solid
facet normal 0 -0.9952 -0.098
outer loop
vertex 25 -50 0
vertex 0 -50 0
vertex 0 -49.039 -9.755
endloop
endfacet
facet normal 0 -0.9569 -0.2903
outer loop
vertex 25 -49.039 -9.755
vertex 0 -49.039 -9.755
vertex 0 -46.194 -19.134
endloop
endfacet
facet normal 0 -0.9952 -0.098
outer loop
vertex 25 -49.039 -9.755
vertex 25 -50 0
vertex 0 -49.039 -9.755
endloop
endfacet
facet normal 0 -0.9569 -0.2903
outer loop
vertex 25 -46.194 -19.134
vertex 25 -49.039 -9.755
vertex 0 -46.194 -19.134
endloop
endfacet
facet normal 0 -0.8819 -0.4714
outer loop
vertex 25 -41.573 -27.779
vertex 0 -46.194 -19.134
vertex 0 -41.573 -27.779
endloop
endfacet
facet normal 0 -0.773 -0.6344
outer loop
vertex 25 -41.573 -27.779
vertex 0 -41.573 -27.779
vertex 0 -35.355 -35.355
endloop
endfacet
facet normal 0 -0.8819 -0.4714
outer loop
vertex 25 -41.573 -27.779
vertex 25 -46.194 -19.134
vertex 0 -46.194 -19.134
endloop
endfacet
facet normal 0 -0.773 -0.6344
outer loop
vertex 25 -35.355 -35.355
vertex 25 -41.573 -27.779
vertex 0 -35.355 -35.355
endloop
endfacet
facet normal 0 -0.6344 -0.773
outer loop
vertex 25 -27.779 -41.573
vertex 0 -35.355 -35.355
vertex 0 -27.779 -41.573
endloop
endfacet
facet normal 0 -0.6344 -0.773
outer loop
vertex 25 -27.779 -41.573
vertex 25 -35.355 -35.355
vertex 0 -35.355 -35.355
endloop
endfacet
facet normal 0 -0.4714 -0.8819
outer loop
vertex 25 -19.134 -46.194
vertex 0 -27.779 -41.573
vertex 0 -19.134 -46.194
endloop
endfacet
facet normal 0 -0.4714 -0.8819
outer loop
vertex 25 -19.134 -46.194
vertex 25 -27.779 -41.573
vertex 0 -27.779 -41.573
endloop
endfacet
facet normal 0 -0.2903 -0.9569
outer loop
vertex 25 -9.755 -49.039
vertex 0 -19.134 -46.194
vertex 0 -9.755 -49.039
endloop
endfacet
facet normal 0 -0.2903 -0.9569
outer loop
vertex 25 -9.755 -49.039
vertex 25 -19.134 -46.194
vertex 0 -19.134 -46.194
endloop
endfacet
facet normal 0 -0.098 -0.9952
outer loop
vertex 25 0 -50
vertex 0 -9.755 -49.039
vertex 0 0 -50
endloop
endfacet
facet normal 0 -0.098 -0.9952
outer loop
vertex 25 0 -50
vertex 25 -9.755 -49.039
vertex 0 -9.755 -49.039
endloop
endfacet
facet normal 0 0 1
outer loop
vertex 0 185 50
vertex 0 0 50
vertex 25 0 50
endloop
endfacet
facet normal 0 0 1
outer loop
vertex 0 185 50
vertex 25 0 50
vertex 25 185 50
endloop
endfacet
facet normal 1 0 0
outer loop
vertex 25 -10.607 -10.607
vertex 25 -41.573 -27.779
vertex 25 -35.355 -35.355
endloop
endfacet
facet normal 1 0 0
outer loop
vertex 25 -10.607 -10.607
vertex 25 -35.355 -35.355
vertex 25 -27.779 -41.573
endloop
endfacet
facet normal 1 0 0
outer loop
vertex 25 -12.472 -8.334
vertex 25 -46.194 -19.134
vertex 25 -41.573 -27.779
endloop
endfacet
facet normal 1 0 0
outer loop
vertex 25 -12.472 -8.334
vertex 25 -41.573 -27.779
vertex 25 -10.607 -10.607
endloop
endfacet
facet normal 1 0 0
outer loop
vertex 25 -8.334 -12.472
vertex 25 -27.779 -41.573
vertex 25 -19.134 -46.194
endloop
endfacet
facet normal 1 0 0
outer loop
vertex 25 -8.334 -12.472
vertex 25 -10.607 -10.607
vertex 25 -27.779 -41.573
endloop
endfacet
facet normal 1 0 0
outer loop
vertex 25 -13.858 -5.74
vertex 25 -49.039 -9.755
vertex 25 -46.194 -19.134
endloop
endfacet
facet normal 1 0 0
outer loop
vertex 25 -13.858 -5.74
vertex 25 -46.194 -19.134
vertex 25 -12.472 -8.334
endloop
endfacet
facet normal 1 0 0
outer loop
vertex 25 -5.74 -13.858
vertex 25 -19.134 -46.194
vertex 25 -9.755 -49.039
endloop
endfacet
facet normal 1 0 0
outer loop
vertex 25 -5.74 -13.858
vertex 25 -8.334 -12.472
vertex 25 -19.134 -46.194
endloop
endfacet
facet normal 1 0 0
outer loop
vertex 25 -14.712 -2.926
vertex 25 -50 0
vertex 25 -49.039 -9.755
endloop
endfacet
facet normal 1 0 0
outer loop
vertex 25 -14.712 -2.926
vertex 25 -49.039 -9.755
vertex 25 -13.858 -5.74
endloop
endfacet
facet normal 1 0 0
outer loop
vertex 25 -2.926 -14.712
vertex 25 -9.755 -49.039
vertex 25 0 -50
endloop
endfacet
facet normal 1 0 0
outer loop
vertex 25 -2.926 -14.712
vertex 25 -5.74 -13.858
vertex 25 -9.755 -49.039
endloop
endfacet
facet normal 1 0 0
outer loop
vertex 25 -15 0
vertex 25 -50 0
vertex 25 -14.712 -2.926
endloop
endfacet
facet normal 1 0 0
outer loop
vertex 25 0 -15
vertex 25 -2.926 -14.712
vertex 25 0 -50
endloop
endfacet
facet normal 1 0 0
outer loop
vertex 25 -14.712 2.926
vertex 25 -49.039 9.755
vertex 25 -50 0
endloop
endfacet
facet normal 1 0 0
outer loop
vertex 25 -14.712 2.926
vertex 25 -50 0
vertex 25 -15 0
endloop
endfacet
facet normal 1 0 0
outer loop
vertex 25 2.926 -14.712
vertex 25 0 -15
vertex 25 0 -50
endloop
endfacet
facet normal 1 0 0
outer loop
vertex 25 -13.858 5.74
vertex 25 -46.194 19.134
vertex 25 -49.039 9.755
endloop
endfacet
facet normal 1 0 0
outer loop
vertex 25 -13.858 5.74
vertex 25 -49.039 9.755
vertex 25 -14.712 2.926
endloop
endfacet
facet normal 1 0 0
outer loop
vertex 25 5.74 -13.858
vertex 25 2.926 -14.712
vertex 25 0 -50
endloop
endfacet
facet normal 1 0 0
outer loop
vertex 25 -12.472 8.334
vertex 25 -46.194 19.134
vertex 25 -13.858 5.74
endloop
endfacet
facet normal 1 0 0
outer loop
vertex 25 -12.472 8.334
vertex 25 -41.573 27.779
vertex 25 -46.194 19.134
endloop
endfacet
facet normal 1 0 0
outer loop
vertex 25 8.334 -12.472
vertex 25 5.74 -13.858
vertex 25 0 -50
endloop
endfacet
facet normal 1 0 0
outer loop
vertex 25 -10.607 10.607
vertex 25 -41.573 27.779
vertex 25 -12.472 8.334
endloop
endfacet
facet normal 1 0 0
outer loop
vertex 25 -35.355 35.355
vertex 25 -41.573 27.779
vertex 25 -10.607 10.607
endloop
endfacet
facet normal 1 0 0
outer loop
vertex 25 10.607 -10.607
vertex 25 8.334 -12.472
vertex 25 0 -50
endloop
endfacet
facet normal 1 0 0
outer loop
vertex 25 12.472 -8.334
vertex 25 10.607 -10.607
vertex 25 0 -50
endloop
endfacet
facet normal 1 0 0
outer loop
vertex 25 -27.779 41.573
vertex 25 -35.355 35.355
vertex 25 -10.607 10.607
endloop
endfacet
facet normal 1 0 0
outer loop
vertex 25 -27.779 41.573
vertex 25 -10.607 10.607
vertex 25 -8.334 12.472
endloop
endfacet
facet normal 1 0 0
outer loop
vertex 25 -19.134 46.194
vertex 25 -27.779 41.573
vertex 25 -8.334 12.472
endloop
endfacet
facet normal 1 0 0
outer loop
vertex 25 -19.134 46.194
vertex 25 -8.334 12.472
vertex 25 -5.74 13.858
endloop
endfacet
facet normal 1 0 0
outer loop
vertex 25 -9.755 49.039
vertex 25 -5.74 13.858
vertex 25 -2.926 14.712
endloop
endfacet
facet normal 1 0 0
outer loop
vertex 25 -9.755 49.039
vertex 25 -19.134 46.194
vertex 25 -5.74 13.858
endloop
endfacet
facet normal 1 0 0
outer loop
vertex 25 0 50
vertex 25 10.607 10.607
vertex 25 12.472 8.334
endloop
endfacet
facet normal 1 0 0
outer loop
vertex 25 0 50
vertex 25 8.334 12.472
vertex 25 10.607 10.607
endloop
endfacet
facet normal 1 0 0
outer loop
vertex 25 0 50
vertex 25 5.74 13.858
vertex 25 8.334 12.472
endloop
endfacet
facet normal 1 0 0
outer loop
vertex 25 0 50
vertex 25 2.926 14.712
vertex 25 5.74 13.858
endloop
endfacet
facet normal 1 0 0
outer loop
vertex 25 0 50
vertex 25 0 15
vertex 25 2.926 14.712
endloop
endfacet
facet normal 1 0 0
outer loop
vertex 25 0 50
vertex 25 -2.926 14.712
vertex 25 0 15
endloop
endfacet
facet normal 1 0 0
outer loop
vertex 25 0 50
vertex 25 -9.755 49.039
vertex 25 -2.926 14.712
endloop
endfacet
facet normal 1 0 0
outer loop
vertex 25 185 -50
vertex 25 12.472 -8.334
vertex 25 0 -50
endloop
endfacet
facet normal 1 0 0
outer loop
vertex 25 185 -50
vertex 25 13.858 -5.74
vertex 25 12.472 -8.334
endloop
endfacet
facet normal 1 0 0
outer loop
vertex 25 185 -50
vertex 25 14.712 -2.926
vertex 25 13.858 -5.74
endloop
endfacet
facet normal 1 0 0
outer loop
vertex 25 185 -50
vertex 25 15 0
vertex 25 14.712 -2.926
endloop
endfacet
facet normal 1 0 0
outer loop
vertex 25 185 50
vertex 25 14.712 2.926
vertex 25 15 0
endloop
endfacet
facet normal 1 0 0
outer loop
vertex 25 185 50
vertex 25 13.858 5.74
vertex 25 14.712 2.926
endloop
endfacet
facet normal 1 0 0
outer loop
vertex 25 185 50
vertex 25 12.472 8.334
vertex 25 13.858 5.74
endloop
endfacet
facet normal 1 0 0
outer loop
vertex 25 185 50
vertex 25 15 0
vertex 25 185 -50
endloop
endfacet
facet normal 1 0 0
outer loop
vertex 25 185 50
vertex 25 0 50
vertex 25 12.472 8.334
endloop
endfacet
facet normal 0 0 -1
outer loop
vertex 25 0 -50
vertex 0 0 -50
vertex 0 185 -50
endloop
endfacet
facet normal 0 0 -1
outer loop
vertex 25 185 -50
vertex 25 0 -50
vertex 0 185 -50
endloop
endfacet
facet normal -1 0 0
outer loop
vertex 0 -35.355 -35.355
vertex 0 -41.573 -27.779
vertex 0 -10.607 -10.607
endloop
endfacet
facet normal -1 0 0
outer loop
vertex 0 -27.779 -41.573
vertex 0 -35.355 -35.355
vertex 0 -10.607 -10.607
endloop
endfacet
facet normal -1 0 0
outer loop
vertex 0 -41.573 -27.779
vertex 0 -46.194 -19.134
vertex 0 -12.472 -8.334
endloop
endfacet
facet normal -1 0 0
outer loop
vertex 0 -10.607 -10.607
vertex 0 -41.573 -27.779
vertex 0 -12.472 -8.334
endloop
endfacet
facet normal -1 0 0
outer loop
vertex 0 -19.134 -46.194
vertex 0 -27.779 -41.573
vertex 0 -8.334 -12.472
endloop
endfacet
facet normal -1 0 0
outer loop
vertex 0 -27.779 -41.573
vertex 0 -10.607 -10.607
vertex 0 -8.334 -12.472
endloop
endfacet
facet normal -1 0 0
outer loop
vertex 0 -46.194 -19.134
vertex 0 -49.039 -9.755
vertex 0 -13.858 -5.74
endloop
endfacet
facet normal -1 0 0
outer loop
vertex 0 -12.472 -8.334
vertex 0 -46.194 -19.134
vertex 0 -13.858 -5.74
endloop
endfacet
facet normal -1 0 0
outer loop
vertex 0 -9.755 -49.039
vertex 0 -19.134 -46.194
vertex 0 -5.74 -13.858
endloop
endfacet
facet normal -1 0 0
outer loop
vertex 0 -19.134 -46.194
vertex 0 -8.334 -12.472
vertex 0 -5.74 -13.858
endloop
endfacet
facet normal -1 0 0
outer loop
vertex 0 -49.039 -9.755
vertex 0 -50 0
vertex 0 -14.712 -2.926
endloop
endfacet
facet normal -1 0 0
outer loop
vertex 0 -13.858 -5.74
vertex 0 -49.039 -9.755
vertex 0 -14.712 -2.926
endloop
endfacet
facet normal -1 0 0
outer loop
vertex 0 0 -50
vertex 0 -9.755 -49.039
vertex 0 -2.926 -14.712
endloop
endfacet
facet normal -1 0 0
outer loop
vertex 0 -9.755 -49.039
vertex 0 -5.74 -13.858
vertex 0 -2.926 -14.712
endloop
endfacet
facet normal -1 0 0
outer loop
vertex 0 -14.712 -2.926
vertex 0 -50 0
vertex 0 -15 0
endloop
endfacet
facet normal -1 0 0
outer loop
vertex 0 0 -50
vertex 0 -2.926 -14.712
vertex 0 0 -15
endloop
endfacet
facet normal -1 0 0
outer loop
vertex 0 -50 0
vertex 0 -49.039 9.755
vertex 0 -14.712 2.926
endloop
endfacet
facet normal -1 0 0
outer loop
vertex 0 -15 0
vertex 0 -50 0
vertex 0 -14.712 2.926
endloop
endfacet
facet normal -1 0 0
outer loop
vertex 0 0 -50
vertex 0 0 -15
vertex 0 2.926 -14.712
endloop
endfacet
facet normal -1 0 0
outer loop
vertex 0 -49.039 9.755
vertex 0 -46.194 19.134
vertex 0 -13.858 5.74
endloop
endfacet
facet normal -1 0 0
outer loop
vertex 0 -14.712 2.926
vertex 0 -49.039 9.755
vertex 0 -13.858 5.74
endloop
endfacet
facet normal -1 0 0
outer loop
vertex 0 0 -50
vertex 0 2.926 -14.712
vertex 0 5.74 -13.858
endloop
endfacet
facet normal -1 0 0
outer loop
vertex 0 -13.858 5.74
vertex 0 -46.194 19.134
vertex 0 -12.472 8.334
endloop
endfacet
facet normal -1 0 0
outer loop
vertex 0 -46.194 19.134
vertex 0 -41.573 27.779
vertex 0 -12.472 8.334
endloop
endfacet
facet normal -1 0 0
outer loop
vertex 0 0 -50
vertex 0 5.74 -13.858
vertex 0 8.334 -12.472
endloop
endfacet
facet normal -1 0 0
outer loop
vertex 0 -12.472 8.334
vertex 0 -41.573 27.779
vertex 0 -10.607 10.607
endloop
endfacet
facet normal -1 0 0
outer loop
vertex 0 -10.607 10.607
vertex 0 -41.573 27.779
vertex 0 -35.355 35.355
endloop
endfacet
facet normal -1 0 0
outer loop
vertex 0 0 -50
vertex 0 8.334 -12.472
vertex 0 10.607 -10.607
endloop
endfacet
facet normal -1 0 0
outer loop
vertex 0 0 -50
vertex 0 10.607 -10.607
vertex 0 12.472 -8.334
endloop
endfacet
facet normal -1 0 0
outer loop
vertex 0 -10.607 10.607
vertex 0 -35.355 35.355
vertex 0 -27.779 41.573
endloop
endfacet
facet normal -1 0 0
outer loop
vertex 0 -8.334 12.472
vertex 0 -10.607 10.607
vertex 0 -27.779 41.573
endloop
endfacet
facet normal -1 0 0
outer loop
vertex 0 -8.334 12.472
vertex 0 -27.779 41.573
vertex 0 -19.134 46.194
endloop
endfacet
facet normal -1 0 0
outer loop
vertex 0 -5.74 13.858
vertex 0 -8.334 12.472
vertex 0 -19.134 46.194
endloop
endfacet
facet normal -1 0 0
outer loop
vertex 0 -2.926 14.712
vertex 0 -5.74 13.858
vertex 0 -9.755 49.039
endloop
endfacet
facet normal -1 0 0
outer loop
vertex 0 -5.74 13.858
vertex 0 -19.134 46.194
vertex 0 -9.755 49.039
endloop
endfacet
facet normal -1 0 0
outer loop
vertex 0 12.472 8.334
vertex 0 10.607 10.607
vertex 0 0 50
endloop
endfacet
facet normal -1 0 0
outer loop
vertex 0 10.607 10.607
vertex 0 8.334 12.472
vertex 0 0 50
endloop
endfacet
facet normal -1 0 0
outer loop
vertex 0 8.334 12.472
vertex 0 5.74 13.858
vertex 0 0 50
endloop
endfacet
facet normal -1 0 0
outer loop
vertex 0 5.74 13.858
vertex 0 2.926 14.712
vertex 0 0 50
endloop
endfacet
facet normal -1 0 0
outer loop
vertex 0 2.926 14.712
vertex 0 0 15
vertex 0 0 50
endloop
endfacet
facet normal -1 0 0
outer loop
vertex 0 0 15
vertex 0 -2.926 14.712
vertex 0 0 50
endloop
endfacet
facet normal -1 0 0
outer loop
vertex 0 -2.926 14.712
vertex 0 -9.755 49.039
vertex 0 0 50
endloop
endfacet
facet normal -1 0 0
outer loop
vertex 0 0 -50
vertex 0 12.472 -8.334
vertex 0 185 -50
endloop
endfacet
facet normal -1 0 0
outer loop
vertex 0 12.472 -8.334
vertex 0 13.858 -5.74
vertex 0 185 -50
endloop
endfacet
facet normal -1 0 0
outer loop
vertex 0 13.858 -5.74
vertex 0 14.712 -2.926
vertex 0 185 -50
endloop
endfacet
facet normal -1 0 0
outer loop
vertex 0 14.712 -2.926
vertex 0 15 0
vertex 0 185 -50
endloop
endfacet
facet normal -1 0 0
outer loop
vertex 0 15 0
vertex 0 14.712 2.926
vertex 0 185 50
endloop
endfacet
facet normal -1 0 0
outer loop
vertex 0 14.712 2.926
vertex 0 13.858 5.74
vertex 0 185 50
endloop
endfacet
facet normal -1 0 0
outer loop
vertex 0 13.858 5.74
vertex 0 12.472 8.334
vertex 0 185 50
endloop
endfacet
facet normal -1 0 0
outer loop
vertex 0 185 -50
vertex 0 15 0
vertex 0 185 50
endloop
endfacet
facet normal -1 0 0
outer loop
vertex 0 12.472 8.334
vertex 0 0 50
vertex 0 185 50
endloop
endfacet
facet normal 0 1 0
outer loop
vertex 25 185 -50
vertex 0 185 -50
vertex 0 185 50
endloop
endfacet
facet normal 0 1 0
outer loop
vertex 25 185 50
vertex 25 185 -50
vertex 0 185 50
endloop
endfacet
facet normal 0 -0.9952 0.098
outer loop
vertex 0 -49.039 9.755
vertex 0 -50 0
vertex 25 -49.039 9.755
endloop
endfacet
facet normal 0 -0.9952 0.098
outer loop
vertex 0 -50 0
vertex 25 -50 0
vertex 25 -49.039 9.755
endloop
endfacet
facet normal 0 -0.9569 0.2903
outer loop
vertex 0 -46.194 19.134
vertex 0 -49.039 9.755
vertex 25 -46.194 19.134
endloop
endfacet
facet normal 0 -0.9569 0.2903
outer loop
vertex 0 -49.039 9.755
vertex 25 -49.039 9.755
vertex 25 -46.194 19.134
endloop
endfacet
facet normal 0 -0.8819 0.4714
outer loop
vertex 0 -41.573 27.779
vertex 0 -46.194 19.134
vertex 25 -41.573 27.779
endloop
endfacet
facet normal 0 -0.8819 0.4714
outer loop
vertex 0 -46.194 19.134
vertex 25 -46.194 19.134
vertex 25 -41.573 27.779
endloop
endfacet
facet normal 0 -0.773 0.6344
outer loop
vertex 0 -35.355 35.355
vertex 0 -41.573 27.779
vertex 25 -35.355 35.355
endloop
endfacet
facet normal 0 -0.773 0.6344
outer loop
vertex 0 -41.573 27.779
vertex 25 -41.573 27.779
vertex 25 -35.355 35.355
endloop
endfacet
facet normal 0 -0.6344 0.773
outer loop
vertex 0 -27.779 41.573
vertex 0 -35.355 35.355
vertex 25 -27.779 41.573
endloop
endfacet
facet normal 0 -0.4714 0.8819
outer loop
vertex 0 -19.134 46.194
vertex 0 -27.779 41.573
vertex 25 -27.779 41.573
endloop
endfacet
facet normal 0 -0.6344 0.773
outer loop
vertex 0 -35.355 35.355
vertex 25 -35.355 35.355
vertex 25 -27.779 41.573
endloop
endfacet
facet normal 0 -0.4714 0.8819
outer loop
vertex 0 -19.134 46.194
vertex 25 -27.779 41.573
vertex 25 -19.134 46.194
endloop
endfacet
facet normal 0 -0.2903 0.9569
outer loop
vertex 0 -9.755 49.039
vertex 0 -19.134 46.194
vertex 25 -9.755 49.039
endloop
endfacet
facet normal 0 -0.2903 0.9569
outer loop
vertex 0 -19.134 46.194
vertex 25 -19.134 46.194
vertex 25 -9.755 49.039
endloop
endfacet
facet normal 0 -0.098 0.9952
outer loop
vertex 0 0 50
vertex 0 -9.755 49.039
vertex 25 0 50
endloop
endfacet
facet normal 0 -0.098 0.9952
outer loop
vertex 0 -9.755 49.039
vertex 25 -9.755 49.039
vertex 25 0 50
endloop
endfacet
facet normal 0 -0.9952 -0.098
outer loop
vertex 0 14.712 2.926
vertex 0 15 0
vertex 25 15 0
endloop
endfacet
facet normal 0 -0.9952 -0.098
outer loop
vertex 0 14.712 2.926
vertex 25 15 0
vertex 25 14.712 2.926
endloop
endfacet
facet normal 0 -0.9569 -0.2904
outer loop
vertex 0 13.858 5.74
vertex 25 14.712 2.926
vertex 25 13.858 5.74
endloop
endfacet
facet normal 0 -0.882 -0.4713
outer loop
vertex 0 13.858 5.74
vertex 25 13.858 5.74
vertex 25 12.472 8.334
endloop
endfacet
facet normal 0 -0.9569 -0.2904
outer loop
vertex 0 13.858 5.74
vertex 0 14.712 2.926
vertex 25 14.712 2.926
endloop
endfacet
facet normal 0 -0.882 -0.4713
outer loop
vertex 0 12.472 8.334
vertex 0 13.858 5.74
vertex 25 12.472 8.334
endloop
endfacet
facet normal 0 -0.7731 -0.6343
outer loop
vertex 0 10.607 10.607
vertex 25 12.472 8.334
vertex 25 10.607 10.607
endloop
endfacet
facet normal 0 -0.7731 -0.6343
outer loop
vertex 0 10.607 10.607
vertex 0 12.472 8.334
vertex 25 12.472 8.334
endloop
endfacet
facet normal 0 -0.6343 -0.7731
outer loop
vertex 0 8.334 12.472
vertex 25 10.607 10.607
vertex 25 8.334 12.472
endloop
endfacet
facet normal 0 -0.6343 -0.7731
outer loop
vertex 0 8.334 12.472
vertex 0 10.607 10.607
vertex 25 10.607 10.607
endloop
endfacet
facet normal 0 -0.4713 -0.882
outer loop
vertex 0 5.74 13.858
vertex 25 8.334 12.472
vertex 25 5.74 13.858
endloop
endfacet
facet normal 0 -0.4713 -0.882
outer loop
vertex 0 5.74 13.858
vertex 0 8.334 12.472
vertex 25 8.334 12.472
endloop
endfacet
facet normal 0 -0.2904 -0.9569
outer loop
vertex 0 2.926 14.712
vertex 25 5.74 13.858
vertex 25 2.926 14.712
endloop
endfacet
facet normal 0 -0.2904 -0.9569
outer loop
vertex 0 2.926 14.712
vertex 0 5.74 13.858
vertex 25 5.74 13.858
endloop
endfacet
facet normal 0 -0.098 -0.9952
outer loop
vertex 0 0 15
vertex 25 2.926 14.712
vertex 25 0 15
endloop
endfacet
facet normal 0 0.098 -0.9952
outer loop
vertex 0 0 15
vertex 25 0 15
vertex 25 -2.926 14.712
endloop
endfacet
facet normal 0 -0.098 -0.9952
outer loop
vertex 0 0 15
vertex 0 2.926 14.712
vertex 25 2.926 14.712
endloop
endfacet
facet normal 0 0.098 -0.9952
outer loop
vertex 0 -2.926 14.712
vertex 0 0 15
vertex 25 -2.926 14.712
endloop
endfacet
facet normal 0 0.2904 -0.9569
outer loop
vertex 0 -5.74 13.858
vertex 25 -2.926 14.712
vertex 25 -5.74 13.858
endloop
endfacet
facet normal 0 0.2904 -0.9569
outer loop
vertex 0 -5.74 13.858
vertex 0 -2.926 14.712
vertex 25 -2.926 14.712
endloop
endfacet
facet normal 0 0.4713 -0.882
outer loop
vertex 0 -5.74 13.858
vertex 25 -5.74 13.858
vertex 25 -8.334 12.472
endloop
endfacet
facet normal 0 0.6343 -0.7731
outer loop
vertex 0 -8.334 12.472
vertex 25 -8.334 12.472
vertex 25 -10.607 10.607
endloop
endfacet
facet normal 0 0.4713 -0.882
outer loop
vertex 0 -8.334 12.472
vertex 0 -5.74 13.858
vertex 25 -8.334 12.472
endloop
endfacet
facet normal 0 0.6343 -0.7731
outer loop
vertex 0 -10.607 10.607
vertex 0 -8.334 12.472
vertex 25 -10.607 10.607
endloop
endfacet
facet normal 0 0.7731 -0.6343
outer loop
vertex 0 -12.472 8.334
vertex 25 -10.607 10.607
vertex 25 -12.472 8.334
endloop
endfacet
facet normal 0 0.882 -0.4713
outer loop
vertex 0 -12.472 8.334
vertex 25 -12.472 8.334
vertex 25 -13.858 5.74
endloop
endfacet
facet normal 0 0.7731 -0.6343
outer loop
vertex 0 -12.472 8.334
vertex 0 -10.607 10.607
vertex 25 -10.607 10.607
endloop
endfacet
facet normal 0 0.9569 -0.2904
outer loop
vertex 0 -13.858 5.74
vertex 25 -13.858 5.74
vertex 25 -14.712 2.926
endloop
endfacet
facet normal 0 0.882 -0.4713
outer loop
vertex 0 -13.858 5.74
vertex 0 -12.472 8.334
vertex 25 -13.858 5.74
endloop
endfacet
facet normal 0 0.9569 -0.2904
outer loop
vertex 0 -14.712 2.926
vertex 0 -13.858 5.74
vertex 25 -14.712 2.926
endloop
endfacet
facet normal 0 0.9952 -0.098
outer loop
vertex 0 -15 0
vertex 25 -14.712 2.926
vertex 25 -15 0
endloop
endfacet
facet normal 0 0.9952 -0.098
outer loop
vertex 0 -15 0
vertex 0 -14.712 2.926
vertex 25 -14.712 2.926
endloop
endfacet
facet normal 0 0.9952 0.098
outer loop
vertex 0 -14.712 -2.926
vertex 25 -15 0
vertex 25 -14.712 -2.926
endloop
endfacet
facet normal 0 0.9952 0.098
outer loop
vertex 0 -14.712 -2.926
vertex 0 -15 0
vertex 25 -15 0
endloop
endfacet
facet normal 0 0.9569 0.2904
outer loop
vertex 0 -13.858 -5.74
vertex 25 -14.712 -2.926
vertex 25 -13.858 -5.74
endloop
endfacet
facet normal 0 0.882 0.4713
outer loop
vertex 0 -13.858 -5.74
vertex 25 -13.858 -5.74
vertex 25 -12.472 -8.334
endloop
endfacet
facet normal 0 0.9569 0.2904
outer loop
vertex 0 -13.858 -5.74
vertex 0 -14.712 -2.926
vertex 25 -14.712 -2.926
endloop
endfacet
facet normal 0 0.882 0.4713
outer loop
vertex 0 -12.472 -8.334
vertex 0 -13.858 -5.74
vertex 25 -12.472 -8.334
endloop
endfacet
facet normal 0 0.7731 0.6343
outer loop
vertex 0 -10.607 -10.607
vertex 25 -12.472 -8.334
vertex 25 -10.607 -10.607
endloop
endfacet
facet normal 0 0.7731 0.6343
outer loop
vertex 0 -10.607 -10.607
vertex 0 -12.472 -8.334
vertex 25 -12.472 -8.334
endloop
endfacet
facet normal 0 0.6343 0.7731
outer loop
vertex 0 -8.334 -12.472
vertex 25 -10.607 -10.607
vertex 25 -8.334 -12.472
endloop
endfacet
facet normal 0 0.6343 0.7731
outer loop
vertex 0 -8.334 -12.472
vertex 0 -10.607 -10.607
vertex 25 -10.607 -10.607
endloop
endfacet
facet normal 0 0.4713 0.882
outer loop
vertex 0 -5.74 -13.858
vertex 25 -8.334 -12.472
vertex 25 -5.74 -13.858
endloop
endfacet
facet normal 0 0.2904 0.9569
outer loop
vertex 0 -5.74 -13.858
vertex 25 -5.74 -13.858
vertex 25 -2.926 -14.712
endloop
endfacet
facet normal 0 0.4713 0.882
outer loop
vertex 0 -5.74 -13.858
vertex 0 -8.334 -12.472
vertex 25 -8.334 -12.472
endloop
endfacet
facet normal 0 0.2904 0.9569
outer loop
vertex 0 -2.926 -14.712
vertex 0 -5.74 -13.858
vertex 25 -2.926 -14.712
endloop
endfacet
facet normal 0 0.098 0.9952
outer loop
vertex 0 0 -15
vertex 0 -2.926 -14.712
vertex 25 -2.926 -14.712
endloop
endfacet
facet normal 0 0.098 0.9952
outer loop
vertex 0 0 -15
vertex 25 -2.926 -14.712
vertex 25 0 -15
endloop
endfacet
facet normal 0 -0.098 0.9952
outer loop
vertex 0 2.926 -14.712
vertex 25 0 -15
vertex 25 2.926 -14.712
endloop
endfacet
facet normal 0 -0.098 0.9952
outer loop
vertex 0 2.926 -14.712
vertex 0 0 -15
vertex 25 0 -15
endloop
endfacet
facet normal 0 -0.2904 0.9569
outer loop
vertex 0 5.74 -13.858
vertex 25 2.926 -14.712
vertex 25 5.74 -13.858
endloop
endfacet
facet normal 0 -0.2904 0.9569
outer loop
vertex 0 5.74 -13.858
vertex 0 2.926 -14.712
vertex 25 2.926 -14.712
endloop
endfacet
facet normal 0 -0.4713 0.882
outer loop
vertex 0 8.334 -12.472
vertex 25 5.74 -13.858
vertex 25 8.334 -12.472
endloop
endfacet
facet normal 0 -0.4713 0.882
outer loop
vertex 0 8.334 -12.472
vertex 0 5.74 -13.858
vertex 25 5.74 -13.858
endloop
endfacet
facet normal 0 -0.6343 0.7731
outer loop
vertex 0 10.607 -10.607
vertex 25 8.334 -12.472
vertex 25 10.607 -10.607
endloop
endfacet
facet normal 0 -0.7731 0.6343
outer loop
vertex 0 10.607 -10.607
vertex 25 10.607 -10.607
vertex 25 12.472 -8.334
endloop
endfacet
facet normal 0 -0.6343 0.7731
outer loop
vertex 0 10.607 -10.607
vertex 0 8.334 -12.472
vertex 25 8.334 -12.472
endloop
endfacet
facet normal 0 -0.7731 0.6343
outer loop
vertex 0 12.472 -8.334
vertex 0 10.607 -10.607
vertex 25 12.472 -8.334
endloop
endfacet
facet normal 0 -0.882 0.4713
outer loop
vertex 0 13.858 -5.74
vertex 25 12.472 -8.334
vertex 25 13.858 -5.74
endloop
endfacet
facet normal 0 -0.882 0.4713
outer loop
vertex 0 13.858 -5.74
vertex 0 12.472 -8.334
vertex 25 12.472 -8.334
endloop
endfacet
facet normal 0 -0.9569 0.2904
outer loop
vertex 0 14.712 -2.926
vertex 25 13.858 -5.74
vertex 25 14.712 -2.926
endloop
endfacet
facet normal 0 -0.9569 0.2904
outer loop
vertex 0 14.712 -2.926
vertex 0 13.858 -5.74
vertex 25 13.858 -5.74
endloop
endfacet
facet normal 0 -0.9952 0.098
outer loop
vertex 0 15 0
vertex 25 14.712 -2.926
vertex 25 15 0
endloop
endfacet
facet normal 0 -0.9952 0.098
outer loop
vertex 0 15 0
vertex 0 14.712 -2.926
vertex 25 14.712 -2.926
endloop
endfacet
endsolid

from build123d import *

# Parameters (mm, degrees)
F0_W     = 235
F0_H     = 100
F0_R     = 15
F1_DEPTH = 25
F2_R     = 49.99999


# Not quite as in the source:
# - a fillet or chamfer is up to 0.001 mm smaller than in the source, because OpenCascade refuses the exact size


with BuildPart() as f1:
    # F0 (on Right) → F1 (new body)
    with BuildSketch(Plane.YZ):
        with Locations((67.5, 0)):
            Rectangle(F0_W, F0_H)
        Circle(F0_R, mode=Mode.SUBTRACT)
    extrude(amount=F1_DEPTH)

    # F2 (radius 50 in the source; OpenCascade refuses exactly that, so slightly less here)
    f2_edges = [f1.edges().sort_by_distance(p)[0] for p in [
        (12.5, -50, 50),
        (12.5, -50, -50),
    ]]
    fillet(f2_edges, radius=F2_R)


solid = f1.part
